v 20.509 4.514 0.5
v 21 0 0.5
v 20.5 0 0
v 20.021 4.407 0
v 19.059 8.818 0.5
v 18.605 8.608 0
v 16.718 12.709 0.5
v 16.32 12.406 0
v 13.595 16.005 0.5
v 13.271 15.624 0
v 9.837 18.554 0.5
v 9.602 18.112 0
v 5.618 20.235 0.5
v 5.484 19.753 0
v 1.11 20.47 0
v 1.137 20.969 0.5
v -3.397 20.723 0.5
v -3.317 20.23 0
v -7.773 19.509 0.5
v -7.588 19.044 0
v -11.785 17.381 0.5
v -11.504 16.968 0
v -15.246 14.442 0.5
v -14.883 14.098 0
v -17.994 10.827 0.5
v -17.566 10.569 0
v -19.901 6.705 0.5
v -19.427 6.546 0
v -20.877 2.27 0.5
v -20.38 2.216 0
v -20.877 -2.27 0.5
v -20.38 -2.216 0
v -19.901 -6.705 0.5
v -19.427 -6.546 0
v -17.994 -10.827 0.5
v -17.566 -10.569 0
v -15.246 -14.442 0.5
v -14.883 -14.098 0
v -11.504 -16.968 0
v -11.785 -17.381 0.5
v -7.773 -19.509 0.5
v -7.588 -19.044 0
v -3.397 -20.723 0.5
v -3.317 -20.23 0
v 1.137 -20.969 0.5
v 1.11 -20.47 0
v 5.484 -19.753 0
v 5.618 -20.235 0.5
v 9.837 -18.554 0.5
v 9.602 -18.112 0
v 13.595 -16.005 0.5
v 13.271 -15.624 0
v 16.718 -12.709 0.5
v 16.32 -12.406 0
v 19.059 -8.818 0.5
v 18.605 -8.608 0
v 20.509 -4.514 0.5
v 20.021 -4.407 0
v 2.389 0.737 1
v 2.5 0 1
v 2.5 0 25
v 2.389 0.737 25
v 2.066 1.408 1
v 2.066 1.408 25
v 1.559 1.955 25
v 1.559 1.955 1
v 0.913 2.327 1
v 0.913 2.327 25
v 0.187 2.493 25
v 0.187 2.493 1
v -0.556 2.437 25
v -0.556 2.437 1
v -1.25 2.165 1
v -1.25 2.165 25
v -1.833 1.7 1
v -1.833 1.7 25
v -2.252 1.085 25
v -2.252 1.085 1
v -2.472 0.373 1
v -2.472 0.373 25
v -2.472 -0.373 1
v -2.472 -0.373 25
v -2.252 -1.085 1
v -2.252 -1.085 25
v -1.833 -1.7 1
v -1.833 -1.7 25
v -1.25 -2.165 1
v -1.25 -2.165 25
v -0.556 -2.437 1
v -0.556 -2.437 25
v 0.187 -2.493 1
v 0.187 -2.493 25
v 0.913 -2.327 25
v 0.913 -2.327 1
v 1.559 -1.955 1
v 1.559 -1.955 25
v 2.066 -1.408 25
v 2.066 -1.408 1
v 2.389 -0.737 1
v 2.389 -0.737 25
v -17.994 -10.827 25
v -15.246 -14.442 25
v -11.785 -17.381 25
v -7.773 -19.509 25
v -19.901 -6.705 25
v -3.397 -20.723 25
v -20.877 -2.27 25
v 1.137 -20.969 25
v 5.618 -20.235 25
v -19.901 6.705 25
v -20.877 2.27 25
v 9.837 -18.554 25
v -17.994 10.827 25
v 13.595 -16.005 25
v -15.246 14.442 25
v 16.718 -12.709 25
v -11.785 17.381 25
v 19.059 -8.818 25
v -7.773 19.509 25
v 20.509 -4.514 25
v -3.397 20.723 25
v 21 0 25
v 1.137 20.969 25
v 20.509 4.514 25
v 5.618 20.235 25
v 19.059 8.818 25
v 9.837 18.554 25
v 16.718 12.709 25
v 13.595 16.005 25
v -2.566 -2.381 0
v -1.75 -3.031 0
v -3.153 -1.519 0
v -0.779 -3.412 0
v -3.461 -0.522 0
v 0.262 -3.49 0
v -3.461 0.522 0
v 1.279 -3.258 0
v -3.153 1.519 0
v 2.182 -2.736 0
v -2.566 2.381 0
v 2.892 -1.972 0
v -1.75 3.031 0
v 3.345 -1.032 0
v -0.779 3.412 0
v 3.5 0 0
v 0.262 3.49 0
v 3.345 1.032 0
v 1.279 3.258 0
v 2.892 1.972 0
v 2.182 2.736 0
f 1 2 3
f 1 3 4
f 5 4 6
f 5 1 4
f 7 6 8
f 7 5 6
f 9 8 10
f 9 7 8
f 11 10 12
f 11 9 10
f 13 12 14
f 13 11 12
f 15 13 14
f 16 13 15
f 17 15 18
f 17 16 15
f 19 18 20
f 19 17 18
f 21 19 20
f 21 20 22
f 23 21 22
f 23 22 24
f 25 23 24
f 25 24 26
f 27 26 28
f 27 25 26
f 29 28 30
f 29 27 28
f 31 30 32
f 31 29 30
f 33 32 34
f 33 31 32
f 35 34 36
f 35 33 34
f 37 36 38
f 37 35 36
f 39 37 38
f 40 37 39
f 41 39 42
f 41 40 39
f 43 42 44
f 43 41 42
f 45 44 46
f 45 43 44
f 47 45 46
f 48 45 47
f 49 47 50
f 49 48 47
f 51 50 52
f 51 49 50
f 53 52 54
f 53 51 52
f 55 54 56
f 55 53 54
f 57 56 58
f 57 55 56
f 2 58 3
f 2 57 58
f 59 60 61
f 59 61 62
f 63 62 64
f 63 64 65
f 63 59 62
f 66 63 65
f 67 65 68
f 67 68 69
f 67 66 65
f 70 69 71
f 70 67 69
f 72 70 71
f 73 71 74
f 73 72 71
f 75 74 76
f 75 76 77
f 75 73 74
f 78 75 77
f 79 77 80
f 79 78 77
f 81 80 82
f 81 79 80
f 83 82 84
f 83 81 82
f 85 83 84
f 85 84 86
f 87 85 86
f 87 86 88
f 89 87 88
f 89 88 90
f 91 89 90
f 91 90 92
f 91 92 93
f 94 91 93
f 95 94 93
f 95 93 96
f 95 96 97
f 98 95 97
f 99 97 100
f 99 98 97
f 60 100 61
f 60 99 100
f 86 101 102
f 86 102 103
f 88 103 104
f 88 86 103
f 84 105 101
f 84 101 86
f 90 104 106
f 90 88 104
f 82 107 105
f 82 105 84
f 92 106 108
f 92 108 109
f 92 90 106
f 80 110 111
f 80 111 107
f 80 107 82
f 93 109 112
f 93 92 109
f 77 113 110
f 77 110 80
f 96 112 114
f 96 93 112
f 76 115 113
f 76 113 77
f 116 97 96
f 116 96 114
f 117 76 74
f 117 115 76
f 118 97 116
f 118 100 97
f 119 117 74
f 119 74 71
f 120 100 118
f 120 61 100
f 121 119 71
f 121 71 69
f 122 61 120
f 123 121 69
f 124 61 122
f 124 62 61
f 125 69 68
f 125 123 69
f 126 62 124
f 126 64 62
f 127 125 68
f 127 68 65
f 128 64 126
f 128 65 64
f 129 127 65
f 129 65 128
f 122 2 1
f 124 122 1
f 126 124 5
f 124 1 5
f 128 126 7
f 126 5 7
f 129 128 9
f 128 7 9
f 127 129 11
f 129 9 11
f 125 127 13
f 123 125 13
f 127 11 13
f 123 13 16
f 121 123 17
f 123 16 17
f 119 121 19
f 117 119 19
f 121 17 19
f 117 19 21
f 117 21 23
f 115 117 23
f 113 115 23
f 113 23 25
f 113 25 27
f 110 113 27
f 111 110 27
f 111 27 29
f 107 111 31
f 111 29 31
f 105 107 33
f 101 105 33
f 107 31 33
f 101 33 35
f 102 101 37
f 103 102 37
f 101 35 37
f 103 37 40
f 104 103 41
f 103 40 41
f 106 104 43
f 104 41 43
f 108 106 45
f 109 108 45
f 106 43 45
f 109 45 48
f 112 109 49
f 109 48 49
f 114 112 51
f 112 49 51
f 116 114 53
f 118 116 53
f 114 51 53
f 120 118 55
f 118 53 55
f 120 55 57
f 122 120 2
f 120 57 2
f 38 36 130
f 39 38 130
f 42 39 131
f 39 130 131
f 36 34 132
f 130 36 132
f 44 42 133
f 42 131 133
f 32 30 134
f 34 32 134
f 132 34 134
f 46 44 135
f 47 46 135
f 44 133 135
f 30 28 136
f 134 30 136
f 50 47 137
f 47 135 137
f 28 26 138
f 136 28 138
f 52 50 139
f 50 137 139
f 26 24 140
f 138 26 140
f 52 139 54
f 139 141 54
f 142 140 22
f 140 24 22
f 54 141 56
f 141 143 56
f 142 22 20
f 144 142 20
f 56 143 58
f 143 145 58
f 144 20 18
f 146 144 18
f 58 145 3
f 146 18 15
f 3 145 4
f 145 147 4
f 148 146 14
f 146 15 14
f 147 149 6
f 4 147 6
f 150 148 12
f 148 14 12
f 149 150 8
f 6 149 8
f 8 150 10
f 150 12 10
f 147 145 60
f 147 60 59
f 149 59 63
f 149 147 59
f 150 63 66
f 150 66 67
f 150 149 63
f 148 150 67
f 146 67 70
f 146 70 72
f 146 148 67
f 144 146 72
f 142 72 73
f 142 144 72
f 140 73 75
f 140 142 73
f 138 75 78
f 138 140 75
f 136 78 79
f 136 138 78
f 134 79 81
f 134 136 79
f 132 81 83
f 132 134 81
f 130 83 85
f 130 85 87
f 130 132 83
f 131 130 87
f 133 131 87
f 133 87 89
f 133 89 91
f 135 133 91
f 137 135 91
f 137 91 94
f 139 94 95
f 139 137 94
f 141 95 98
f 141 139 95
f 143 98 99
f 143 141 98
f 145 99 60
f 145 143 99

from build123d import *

# Parameters (mm, degrees)
F0_R     = 21
F0_R_2   = 2.5
F1_DEPTH = 25
F2_SIZE  = 1
F3_SIZE  = 0.5


with BuildPart() as f1:
    # F0 (on Top) → F1 (new body)
    with BuildSketch(Plane.XY):
        Circle(F0_R)
        Circle(F0_R_2, mode=Mode.SUBTRACT)
    extrude(amount=F1_DEPTH)

    # F2
    f2_edges = [f1.edges().sort_by_distance(p)[0] for p in [
        (-2.5, 0, 0),
    ]]
    chamfer(f2_edges, length=F2_SIZE)

    # F3
    f3_edges = [f1.edges().sort_by_distance(p)[0] for p in [
        (-21, 0, 0),
    ]]
    chamfer(f3_edges, length=F3_SIZE)


solid = f1.part
